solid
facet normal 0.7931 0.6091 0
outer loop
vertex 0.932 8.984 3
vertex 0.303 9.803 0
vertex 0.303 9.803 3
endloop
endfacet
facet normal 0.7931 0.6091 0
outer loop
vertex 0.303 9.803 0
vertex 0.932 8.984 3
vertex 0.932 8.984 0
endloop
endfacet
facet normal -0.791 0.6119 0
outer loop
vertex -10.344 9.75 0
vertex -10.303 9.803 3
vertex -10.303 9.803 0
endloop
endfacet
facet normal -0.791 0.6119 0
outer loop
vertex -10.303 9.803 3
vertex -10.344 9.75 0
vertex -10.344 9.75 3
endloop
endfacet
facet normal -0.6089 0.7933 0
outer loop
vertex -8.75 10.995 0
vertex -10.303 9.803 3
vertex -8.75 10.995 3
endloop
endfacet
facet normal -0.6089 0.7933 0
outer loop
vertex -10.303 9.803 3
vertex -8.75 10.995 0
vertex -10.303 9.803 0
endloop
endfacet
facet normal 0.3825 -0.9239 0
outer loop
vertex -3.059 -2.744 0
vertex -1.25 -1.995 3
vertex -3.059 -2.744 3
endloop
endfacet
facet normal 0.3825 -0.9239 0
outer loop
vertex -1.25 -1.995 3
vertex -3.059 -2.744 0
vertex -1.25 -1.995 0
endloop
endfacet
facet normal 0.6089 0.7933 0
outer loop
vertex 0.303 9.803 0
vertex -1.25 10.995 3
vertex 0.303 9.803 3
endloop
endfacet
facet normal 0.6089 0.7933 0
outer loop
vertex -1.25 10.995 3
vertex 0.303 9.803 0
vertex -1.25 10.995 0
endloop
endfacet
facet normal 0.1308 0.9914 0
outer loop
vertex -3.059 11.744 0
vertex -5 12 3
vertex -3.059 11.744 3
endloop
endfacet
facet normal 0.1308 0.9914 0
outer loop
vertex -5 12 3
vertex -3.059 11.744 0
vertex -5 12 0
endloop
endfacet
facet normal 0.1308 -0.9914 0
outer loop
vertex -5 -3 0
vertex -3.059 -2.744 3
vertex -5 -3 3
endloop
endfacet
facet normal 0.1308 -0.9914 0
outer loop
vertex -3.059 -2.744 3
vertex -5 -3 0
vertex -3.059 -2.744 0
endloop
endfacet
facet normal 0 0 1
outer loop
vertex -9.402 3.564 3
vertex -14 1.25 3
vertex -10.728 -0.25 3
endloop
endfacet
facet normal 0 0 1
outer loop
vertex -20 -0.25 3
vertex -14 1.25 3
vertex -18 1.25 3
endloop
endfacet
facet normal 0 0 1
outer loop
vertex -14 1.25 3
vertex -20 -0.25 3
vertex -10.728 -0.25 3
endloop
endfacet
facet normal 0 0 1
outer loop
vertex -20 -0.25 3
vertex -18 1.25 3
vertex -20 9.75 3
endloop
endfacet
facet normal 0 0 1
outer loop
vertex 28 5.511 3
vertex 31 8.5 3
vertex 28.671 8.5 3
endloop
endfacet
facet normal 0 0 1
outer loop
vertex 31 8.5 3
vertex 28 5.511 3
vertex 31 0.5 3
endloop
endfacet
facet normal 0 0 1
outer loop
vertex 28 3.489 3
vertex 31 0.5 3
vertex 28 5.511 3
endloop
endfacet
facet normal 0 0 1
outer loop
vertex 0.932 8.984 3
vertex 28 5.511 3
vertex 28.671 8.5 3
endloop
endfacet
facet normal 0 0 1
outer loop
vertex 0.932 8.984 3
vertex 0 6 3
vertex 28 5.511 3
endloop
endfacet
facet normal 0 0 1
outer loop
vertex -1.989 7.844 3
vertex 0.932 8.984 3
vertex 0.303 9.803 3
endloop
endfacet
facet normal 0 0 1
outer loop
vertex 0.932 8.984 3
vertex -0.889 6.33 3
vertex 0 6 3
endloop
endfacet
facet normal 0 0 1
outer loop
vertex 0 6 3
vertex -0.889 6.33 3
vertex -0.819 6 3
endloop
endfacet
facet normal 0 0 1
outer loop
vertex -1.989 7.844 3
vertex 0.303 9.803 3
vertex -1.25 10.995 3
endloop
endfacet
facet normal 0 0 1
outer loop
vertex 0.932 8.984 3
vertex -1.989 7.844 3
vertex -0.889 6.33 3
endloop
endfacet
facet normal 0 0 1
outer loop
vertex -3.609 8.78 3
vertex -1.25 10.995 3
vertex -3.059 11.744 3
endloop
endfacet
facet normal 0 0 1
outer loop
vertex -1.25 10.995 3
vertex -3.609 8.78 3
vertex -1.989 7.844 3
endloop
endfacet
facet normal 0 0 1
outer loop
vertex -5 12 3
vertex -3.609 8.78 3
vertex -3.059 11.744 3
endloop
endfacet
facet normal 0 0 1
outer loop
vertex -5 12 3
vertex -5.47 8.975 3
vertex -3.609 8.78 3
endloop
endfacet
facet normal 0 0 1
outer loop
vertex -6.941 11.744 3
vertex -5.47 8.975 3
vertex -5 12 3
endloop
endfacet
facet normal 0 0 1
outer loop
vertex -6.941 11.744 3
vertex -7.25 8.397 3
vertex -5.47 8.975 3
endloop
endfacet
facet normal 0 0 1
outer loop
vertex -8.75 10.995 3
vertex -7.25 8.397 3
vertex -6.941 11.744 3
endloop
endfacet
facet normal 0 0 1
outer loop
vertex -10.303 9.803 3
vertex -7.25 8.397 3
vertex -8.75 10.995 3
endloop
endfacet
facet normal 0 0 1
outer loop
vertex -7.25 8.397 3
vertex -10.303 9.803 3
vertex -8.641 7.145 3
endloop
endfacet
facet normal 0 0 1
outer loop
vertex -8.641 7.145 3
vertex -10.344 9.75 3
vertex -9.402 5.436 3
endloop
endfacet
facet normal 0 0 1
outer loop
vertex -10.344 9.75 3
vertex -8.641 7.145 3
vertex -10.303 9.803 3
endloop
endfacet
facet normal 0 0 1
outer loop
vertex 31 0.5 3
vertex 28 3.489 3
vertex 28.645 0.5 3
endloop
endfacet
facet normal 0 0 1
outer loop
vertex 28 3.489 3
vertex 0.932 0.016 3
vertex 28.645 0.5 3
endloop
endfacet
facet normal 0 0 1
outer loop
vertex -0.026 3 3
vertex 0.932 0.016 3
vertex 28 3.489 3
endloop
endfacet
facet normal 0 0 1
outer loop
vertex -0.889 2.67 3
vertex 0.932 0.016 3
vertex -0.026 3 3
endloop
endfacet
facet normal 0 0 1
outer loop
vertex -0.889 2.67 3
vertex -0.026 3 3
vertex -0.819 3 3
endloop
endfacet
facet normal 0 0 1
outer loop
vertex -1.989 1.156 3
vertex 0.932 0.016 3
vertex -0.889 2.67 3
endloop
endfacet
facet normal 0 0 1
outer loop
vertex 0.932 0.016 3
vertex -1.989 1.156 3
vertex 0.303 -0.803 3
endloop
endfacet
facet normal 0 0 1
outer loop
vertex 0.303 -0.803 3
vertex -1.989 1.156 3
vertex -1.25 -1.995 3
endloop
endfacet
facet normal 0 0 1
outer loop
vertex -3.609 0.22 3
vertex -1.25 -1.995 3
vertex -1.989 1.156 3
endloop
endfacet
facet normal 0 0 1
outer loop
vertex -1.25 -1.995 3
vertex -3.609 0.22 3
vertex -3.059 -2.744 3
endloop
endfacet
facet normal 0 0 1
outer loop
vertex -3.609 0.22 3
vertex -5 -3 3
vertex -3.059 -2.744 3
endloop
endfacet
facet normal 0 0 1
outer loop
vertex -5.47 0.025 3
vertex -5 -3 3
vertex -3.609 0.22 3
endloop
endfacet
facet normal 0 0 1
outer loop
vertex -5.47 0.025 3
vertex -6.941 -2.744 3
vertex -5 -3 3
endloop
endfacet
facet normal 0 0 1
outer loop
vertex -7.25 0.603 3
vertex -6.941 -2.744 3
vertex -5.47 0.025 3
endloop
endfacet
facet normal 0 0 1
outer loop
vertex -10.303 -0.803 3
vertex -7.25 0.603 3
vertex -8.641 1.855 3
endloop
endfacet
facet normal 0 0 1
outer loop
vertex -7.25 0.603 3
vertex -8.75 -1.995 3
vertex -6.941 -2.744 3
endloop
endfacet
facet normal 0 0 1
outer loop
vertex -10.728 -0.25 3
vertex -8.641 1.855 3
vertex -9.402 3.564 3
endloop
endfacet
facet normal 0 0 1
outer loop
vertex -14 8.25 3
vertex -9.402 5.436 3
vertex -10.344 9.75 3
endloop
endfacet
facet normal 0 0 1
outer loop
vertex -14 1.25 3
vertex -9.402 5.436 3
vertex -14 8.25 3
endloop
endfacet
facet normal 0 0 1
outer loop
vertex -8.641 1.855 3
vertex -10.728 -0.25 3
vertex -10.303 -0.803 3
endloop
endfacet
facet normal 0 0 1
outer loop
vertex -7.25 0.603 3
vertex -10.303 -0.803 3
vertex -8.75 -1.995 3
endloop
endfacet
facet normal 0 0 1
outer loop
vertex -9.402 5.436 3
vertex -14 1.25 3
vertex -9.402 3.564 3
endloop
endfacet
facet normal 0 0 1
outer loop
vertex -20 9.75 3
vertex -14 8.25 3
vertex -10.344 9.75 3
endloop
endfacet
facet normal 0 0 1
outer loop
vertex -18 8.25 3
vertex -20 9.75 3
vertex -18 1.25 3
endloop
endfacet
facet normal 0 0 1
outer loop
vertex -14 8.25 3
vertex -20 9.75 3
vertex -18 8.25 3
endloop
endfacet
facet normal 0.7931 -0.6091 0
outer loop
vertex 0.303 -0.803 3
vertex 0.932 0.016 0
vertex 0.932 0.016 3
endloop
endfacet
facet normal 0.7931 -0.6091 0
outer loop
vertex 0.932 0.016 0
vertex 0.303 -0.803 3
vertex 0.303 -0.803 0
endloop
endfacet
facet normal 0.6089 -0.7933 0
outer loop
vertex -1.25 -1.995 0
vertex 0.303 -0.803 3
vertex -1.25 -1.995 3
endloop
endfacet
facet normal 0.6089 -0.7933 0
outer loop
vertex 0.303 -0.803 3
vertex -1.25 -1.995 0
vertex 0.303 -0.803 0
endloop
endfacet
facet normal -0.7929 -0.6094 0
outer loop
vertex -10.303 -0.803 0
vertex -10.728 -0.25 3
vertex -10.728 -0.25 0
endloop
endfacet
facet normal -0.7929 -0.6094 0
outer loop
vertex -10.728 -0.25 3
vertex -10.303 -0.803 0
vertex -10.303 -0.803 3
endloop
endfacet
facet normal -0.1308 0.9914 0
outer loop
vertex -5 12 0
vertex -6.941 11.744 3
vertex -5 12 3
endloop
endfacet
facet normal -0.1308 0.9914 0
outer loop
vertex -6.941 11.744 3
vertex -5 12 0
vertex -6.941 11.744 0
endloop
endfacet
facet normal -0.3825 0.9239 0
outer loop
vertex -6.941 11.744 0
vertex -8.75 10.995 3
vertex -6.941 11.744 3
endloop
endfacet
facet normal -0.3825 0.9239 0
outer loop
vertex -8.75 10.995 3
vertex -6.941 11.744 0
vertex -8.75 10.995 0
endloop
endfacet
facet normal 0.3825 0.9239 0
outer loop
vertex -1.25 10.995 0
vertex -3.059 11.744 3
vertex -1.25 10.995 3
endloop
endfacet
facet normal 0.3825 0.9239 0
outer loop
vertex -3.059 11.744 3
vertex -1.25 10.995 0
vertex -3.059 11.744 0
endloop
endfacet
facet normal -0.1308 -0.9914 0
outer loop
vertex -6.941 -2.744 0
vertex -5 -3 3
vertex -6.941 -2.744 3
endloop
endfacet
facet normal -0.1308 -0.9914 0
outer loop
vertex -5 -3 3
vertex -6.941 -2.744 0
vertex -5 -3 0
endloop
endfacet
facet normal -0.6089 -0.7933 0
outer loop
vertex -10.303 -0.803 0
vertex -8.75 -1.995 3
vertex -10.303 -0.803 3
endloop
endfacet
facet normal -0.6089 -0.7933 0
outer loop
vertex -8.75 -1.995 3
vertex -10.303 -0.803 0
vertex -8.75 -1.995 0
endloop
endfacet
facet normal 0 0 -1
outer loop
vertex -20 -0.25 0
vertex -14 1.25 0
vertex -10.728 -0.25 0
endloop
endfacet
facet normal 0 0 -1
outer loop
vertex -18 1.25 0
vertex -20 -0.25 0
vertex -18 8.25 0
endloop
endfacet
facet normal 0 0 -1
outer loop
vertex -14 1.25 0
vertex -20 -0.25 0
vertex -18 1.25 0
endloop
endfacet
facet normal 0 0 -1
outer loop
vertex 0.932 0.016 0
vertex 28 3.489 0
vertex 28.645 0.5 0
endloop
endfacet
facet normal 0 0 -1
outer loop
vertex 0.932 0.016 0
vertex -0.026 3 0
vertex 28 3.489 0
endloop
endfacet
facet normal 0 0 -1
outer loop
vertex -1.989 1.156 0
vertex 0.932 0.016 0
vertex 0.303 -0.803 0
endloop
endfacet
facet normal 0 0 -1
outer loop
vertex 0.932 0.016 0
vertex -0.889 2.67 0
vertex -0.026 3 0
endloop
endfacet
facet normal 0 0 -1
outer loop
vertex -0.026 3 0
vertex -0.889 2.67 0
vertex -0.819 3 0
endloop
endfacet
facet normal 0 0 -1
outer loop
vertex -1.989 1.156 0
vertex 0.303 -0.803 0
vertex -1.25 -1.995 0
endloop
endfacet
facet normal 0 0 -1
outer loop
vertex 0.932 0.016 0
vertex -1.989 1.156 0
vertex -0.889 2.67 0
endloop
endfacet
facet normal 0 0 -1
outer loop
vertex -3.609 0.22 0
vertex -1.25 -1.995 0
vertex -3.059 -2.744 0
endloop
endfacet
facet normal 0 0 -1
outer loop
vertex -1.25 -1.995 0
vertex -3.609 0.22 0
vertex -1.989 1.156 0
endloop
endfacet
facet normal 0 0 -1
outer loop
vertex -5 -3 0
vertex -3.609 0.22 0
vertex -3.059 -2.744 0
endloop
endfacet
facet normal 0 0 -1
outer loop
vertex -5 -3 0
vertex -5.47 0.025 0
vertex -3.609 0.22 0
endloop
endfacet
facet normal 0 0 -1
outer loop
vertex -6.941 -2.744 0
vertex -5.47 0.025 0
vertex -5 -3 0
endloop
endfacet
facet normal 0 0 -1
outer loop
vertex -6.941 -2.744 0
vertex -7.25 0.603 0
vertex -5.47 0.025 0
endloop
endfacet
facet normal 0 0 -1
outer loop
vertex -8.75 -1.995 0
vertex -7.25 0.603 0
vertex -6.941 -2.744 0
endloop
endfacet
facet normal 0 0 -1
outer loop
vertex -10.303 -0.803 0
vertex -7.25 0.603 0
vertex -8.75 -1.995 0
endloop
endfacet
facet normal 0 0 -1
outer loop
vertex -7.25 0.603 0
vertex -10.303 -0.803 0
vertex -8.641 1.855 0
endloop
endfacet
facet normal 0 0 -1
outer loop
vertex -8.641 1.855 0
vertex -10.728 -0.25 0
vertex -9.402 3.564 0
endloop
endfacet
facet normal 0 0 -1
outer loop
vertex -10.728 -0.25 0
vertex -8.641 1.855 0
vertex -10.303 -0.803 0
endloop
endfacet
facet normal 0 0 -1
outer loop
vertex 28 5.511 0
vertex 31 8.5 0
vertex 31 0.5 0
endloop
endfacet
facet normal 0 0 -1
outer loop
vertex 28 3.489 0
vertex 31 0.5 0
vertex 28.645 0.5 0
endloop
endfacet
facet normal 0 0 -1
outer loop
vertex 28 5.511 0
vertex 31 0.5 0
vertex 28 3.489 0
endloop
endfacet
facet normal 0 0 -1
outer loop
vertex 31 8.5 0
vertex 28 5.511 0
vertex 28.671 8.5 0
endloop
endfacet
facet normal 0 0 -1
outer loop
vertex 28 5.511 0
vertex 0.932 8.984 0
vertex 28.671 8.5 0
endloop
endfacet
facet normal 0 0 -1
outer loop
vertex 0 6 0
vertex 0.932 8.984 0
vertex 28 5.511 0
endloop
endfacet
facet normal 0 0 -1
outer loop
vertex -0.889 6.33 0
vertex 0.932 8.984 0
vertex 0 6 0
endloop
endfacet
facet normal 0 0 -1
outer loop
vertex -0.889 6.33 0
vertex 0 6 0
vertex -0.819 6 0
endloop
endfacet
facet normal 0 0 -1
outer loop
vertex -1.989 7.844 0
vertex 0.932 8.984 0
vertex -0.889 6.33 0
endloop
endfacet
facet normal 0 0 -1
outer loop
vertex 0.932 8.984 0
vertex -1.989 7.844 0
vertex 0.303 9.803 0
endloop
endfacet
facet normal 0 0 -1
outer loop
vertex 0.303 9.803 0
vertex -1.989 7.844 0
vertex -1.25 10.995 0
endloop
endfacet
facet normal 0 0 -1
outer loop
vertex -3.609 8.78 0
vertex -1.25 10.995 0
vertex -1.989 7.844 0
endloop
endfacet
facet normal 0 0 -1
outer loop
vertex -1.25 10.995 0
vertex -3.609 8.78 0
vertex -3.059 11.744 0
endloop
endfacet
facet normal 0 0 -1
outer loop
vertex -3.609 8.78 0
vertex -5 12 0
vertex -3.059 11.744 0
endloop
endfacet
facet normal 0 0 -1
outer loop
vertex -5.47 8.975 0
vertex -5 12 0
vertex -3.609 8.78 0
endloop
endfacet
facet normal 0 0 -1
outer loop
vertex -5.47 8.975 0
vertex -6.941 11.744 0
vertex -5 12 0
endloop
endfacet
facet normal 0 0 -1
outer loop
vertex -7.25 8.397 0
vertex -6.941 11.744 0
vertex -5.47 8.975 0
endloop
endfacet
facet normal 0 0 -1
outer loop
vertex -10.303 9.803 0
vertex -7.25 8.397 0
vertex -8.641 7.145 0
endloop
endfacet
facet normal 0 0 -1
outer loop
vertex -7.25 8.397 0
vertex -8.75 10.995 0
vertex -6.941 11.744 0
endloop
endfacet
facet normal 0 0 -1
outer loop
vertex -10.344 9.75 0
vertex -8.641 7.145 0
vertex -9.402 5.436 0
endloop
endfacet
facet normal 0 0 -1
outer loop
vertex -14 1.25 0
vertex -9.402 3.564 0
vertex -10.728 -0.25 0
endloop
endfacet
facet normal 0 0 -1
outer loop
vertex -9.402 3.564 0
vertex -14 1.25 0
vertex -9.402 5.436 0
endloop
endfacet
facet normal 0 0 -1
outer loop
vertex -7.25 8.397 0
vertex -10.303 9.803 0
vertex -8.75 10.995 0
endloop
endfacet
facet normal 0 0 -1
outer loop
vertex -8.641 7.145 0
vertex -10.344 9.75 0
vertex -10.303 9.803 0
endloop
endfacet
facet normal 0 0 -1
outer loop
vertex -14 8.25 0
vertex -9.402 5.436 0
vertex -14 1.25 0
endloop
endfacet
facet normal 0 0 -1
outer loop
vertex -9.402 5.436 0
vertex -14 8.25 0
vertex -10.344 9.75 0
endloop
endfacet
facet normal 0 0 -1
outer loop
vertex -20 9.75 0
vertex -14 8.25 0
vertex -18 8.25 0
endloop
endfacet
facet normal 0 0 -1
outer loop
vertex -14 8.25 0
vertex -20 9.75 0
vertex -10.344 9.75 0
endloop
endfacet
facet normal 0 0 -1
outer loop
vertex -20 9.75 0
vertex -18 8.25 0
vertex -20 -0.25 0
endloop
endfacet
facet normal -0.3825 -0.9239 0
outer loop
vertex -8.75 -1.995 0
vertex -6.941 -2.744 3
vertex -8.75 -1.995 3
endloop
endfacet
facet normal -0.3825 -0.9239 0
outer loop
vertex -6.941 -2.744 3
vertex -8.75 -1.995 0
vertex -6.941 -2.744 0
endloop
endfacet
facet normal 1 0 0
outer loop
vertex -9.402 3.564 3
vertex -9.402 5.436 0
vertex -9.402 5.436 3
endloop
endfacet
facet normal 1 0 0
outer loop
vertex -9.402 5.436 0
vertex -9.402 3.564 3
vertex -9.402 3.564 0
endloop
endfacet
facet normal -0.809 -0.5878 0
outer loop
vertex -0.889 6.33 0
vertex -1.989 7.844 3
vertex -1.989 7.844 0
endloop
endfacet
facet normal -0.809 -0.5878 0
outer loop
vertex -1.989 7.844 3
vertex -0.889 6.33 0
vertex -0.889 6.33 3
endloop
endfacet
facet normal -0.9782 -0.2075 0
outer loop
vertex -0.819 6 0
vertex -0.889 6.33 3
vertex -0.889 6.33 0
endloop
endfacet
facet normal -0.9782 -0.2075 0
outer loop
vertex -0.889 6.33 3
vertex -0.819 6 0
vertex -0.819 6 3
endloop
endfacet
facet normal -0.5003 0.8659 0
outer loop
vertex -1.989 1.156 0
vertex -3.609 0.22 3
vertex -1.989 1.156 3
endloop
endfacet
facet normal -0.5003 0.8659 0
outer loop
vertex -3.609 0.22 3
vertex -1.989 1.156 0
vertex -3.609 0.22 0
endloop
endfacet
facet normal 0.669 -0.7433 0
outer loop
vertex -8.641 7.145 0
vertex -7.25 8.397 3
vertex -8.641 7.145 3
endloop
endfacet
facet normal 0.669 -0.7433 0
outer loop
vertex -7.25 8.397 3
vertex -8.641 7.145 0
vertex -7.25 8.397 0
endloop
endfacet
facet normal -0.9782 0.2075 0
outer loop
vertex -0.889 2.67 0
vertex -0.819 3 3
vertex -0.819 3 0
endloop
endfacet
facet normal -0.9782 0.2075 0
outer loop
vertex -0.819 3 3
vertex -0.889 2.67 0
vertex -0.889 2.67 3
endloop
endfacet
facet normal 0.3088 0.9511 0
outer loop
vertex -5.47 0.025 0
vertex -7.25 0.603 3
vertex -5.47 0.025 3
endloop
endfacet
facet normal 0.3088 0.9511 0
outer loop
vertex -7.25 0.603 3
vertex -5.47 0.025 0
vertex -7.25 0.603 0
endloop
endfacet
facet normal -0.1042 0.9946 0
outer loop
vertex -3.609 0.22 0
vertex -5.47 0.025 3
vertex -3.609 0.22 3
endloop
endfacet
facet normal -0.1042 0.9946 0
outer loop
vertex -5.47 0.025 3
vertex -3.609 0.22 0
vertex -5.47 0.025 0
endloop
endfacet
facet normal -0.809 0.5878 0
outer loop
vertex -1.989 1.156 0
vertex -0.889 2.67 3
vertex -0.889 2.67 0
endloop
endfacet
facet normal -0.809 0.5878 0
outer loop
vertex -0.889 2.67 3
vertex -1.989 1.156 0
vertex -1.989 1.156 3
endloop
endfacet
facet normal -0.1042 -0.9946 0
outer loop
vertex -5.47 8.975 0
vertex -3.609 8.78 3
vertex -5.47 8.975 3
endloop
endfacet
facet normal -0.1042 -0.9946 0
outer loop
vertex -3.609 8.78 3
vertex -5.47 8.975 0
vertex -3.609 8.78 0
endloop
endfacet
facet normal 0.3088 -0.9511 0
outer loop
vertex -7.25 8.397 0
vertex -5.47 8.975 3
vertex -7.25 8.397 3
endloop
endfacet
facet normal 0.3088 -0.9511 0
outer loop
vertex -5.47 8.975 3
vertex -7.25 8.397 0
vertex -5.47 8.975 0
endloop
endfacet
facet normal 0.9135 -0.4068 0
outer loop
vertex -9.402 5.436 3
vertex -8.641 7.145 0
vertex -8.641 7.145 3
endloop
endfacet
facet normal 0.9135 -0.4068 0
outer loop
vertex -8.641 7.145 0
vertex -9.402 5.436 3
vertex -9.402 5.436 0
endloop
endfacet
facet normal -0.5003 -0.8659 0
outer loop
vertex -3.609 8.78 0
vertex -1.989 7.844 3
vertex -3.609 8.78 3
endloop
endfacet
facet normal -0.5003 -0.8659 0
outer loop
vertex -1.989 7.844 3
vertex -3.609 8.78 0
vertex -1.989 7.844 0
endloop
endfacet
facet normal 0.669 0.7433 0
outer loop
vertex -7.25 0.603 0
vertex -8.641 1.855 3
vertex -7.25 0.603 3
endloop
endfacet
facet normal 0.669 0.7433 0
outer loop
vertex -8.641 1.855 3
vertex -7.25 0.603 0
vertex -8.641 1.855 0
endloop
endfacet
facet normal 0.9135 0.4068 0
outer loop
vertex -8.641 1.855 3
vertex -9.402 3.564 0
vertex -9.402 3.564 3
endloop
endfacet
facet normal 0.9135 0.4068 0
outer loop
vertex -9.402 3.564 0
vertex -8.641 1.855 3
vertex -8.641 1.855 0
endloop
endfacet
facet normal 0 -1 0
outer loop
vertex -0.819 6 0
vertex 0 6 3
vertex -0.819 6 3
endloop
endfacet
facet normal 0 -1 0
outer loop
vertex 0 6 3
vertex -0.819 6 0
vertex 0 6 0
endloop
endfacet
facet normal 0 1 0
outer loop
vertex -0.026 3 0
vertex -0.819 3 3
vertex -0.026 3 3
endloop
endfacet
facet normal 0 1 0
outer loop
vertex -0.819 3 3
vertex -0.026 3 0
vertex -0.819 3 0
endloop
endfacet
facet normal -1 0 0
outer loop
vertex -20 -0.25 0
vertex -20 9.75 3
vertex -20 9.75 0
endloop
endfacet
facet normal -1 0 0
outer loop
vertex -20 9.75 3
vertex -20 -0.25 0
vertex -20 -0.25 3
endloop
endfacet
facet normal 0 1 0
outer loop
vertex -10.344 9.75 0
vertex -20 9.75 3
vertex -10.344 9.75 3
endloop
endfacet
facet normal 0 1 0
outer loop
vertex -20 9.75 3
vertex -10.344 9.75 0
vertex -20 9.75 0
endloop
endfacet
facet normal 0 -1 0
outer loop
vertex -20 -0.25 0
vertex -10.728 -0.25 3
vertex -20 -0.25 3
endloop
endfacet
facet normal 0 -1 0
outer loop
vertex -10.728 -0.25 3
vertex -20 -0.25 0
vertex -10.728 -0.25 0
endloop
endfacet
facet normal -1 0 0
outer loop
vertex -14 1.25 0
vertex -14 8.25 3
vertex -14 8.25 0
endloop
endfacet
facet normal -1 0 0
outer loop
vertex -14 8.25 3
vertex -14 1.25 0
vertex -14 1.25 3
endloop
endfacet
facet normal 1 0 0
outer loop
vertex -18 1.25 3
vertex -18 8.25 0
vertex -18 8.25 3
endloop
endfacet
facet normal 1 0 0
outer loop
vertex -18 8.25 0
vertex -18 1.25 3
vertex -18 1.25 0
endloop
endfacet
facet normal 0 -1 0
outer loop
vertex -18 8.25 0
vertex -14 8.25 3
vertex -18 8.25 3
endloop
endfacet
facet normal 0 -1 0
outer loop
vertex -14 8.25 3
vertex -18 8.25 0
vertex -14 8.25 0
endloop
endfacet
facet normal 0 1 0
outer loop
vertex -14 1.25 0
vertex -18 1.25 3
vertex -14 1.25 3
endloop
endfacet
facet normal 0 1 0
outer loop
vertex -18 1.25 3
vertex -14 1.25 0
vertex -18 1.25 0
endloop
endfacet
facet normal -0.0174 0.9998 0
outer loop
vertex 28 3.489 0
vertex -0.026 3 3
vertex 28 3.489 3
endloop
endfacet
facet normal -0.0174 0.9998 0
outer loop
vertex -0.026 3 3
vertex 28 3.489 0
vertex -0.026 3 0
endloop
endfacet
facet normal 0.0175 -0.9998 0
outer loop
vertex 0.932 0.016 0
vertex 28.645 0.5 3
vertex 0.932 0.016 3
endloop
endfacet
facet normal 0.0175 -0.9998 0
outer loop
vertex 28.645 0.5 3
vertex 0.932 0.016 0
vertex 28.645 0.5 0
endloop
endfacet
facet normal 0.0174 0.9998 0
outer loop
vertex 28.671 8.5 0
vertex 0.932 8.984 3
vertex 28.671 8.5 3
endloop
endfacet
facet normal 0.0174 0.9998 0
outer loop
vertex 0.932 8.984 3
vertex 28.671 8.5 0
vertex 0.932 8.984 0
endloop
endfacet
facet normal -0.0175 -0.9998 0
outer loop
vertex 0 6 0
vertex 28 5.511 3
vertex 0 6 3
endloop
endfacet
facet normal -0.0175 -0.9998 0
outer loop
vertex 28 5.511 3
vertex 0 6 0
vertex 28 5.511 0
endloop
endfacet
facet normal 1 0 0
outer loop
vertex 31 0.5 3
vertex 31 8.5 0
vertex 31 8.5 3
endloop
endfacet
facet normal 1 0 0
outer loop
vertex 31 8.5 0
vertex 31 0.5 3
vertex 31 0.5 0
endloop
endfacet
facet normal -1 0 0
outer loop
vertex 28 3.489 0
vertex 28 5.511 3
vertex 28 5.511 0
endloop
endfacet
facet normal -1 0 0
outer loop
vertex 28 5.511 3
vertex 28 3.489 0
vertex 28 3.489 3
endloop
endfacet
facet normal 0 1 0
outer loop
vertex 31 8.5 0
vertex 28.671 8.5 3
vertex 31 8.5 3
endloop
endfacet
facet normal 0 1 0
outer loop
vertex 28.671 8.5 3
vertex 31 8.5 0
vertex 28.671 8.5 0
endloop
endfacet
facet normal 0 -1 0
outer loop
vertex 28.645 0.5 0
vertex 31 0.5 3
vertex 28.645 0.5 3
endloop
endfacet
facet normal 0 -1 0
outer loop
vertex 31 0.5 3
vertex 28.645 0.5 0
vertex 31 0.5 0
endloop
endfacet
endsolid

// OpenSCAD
// CSG.scad - Basic example of CSG usage

thickness = 3;


rotate([0,0,1]) {  
  cube([30, thickness, thickness]);
}


translate ([0, 3 + thickness, 0]) {
    rotate([0,0,-1]) {
       cube([30, thickness, thickness]);
    }
}

translate([28,0.5,0]) {
   cube(size=[thickness, 8, thickness]);
}

cyl = 15;

translate([-5, 4.5, 0]) {

difference() {
    cylinder(h=thickness,d=cyl);
    translate([0, 0, -1]) {
        cylinder(h=thickness + 2,d=cyl-(thickness*2));
    }  
    translate([5,0,1]) {
        cube([5, thickness, 6], center=true);     
    }  
}
}

translate([-20,-0.25,0]) {

  difference() {
      cube([10, 10, thickness]);
      translate([2, 1.5, -2]) {
          cube([4, 7, 7]);
      }
  }
}


echo(version=version());
